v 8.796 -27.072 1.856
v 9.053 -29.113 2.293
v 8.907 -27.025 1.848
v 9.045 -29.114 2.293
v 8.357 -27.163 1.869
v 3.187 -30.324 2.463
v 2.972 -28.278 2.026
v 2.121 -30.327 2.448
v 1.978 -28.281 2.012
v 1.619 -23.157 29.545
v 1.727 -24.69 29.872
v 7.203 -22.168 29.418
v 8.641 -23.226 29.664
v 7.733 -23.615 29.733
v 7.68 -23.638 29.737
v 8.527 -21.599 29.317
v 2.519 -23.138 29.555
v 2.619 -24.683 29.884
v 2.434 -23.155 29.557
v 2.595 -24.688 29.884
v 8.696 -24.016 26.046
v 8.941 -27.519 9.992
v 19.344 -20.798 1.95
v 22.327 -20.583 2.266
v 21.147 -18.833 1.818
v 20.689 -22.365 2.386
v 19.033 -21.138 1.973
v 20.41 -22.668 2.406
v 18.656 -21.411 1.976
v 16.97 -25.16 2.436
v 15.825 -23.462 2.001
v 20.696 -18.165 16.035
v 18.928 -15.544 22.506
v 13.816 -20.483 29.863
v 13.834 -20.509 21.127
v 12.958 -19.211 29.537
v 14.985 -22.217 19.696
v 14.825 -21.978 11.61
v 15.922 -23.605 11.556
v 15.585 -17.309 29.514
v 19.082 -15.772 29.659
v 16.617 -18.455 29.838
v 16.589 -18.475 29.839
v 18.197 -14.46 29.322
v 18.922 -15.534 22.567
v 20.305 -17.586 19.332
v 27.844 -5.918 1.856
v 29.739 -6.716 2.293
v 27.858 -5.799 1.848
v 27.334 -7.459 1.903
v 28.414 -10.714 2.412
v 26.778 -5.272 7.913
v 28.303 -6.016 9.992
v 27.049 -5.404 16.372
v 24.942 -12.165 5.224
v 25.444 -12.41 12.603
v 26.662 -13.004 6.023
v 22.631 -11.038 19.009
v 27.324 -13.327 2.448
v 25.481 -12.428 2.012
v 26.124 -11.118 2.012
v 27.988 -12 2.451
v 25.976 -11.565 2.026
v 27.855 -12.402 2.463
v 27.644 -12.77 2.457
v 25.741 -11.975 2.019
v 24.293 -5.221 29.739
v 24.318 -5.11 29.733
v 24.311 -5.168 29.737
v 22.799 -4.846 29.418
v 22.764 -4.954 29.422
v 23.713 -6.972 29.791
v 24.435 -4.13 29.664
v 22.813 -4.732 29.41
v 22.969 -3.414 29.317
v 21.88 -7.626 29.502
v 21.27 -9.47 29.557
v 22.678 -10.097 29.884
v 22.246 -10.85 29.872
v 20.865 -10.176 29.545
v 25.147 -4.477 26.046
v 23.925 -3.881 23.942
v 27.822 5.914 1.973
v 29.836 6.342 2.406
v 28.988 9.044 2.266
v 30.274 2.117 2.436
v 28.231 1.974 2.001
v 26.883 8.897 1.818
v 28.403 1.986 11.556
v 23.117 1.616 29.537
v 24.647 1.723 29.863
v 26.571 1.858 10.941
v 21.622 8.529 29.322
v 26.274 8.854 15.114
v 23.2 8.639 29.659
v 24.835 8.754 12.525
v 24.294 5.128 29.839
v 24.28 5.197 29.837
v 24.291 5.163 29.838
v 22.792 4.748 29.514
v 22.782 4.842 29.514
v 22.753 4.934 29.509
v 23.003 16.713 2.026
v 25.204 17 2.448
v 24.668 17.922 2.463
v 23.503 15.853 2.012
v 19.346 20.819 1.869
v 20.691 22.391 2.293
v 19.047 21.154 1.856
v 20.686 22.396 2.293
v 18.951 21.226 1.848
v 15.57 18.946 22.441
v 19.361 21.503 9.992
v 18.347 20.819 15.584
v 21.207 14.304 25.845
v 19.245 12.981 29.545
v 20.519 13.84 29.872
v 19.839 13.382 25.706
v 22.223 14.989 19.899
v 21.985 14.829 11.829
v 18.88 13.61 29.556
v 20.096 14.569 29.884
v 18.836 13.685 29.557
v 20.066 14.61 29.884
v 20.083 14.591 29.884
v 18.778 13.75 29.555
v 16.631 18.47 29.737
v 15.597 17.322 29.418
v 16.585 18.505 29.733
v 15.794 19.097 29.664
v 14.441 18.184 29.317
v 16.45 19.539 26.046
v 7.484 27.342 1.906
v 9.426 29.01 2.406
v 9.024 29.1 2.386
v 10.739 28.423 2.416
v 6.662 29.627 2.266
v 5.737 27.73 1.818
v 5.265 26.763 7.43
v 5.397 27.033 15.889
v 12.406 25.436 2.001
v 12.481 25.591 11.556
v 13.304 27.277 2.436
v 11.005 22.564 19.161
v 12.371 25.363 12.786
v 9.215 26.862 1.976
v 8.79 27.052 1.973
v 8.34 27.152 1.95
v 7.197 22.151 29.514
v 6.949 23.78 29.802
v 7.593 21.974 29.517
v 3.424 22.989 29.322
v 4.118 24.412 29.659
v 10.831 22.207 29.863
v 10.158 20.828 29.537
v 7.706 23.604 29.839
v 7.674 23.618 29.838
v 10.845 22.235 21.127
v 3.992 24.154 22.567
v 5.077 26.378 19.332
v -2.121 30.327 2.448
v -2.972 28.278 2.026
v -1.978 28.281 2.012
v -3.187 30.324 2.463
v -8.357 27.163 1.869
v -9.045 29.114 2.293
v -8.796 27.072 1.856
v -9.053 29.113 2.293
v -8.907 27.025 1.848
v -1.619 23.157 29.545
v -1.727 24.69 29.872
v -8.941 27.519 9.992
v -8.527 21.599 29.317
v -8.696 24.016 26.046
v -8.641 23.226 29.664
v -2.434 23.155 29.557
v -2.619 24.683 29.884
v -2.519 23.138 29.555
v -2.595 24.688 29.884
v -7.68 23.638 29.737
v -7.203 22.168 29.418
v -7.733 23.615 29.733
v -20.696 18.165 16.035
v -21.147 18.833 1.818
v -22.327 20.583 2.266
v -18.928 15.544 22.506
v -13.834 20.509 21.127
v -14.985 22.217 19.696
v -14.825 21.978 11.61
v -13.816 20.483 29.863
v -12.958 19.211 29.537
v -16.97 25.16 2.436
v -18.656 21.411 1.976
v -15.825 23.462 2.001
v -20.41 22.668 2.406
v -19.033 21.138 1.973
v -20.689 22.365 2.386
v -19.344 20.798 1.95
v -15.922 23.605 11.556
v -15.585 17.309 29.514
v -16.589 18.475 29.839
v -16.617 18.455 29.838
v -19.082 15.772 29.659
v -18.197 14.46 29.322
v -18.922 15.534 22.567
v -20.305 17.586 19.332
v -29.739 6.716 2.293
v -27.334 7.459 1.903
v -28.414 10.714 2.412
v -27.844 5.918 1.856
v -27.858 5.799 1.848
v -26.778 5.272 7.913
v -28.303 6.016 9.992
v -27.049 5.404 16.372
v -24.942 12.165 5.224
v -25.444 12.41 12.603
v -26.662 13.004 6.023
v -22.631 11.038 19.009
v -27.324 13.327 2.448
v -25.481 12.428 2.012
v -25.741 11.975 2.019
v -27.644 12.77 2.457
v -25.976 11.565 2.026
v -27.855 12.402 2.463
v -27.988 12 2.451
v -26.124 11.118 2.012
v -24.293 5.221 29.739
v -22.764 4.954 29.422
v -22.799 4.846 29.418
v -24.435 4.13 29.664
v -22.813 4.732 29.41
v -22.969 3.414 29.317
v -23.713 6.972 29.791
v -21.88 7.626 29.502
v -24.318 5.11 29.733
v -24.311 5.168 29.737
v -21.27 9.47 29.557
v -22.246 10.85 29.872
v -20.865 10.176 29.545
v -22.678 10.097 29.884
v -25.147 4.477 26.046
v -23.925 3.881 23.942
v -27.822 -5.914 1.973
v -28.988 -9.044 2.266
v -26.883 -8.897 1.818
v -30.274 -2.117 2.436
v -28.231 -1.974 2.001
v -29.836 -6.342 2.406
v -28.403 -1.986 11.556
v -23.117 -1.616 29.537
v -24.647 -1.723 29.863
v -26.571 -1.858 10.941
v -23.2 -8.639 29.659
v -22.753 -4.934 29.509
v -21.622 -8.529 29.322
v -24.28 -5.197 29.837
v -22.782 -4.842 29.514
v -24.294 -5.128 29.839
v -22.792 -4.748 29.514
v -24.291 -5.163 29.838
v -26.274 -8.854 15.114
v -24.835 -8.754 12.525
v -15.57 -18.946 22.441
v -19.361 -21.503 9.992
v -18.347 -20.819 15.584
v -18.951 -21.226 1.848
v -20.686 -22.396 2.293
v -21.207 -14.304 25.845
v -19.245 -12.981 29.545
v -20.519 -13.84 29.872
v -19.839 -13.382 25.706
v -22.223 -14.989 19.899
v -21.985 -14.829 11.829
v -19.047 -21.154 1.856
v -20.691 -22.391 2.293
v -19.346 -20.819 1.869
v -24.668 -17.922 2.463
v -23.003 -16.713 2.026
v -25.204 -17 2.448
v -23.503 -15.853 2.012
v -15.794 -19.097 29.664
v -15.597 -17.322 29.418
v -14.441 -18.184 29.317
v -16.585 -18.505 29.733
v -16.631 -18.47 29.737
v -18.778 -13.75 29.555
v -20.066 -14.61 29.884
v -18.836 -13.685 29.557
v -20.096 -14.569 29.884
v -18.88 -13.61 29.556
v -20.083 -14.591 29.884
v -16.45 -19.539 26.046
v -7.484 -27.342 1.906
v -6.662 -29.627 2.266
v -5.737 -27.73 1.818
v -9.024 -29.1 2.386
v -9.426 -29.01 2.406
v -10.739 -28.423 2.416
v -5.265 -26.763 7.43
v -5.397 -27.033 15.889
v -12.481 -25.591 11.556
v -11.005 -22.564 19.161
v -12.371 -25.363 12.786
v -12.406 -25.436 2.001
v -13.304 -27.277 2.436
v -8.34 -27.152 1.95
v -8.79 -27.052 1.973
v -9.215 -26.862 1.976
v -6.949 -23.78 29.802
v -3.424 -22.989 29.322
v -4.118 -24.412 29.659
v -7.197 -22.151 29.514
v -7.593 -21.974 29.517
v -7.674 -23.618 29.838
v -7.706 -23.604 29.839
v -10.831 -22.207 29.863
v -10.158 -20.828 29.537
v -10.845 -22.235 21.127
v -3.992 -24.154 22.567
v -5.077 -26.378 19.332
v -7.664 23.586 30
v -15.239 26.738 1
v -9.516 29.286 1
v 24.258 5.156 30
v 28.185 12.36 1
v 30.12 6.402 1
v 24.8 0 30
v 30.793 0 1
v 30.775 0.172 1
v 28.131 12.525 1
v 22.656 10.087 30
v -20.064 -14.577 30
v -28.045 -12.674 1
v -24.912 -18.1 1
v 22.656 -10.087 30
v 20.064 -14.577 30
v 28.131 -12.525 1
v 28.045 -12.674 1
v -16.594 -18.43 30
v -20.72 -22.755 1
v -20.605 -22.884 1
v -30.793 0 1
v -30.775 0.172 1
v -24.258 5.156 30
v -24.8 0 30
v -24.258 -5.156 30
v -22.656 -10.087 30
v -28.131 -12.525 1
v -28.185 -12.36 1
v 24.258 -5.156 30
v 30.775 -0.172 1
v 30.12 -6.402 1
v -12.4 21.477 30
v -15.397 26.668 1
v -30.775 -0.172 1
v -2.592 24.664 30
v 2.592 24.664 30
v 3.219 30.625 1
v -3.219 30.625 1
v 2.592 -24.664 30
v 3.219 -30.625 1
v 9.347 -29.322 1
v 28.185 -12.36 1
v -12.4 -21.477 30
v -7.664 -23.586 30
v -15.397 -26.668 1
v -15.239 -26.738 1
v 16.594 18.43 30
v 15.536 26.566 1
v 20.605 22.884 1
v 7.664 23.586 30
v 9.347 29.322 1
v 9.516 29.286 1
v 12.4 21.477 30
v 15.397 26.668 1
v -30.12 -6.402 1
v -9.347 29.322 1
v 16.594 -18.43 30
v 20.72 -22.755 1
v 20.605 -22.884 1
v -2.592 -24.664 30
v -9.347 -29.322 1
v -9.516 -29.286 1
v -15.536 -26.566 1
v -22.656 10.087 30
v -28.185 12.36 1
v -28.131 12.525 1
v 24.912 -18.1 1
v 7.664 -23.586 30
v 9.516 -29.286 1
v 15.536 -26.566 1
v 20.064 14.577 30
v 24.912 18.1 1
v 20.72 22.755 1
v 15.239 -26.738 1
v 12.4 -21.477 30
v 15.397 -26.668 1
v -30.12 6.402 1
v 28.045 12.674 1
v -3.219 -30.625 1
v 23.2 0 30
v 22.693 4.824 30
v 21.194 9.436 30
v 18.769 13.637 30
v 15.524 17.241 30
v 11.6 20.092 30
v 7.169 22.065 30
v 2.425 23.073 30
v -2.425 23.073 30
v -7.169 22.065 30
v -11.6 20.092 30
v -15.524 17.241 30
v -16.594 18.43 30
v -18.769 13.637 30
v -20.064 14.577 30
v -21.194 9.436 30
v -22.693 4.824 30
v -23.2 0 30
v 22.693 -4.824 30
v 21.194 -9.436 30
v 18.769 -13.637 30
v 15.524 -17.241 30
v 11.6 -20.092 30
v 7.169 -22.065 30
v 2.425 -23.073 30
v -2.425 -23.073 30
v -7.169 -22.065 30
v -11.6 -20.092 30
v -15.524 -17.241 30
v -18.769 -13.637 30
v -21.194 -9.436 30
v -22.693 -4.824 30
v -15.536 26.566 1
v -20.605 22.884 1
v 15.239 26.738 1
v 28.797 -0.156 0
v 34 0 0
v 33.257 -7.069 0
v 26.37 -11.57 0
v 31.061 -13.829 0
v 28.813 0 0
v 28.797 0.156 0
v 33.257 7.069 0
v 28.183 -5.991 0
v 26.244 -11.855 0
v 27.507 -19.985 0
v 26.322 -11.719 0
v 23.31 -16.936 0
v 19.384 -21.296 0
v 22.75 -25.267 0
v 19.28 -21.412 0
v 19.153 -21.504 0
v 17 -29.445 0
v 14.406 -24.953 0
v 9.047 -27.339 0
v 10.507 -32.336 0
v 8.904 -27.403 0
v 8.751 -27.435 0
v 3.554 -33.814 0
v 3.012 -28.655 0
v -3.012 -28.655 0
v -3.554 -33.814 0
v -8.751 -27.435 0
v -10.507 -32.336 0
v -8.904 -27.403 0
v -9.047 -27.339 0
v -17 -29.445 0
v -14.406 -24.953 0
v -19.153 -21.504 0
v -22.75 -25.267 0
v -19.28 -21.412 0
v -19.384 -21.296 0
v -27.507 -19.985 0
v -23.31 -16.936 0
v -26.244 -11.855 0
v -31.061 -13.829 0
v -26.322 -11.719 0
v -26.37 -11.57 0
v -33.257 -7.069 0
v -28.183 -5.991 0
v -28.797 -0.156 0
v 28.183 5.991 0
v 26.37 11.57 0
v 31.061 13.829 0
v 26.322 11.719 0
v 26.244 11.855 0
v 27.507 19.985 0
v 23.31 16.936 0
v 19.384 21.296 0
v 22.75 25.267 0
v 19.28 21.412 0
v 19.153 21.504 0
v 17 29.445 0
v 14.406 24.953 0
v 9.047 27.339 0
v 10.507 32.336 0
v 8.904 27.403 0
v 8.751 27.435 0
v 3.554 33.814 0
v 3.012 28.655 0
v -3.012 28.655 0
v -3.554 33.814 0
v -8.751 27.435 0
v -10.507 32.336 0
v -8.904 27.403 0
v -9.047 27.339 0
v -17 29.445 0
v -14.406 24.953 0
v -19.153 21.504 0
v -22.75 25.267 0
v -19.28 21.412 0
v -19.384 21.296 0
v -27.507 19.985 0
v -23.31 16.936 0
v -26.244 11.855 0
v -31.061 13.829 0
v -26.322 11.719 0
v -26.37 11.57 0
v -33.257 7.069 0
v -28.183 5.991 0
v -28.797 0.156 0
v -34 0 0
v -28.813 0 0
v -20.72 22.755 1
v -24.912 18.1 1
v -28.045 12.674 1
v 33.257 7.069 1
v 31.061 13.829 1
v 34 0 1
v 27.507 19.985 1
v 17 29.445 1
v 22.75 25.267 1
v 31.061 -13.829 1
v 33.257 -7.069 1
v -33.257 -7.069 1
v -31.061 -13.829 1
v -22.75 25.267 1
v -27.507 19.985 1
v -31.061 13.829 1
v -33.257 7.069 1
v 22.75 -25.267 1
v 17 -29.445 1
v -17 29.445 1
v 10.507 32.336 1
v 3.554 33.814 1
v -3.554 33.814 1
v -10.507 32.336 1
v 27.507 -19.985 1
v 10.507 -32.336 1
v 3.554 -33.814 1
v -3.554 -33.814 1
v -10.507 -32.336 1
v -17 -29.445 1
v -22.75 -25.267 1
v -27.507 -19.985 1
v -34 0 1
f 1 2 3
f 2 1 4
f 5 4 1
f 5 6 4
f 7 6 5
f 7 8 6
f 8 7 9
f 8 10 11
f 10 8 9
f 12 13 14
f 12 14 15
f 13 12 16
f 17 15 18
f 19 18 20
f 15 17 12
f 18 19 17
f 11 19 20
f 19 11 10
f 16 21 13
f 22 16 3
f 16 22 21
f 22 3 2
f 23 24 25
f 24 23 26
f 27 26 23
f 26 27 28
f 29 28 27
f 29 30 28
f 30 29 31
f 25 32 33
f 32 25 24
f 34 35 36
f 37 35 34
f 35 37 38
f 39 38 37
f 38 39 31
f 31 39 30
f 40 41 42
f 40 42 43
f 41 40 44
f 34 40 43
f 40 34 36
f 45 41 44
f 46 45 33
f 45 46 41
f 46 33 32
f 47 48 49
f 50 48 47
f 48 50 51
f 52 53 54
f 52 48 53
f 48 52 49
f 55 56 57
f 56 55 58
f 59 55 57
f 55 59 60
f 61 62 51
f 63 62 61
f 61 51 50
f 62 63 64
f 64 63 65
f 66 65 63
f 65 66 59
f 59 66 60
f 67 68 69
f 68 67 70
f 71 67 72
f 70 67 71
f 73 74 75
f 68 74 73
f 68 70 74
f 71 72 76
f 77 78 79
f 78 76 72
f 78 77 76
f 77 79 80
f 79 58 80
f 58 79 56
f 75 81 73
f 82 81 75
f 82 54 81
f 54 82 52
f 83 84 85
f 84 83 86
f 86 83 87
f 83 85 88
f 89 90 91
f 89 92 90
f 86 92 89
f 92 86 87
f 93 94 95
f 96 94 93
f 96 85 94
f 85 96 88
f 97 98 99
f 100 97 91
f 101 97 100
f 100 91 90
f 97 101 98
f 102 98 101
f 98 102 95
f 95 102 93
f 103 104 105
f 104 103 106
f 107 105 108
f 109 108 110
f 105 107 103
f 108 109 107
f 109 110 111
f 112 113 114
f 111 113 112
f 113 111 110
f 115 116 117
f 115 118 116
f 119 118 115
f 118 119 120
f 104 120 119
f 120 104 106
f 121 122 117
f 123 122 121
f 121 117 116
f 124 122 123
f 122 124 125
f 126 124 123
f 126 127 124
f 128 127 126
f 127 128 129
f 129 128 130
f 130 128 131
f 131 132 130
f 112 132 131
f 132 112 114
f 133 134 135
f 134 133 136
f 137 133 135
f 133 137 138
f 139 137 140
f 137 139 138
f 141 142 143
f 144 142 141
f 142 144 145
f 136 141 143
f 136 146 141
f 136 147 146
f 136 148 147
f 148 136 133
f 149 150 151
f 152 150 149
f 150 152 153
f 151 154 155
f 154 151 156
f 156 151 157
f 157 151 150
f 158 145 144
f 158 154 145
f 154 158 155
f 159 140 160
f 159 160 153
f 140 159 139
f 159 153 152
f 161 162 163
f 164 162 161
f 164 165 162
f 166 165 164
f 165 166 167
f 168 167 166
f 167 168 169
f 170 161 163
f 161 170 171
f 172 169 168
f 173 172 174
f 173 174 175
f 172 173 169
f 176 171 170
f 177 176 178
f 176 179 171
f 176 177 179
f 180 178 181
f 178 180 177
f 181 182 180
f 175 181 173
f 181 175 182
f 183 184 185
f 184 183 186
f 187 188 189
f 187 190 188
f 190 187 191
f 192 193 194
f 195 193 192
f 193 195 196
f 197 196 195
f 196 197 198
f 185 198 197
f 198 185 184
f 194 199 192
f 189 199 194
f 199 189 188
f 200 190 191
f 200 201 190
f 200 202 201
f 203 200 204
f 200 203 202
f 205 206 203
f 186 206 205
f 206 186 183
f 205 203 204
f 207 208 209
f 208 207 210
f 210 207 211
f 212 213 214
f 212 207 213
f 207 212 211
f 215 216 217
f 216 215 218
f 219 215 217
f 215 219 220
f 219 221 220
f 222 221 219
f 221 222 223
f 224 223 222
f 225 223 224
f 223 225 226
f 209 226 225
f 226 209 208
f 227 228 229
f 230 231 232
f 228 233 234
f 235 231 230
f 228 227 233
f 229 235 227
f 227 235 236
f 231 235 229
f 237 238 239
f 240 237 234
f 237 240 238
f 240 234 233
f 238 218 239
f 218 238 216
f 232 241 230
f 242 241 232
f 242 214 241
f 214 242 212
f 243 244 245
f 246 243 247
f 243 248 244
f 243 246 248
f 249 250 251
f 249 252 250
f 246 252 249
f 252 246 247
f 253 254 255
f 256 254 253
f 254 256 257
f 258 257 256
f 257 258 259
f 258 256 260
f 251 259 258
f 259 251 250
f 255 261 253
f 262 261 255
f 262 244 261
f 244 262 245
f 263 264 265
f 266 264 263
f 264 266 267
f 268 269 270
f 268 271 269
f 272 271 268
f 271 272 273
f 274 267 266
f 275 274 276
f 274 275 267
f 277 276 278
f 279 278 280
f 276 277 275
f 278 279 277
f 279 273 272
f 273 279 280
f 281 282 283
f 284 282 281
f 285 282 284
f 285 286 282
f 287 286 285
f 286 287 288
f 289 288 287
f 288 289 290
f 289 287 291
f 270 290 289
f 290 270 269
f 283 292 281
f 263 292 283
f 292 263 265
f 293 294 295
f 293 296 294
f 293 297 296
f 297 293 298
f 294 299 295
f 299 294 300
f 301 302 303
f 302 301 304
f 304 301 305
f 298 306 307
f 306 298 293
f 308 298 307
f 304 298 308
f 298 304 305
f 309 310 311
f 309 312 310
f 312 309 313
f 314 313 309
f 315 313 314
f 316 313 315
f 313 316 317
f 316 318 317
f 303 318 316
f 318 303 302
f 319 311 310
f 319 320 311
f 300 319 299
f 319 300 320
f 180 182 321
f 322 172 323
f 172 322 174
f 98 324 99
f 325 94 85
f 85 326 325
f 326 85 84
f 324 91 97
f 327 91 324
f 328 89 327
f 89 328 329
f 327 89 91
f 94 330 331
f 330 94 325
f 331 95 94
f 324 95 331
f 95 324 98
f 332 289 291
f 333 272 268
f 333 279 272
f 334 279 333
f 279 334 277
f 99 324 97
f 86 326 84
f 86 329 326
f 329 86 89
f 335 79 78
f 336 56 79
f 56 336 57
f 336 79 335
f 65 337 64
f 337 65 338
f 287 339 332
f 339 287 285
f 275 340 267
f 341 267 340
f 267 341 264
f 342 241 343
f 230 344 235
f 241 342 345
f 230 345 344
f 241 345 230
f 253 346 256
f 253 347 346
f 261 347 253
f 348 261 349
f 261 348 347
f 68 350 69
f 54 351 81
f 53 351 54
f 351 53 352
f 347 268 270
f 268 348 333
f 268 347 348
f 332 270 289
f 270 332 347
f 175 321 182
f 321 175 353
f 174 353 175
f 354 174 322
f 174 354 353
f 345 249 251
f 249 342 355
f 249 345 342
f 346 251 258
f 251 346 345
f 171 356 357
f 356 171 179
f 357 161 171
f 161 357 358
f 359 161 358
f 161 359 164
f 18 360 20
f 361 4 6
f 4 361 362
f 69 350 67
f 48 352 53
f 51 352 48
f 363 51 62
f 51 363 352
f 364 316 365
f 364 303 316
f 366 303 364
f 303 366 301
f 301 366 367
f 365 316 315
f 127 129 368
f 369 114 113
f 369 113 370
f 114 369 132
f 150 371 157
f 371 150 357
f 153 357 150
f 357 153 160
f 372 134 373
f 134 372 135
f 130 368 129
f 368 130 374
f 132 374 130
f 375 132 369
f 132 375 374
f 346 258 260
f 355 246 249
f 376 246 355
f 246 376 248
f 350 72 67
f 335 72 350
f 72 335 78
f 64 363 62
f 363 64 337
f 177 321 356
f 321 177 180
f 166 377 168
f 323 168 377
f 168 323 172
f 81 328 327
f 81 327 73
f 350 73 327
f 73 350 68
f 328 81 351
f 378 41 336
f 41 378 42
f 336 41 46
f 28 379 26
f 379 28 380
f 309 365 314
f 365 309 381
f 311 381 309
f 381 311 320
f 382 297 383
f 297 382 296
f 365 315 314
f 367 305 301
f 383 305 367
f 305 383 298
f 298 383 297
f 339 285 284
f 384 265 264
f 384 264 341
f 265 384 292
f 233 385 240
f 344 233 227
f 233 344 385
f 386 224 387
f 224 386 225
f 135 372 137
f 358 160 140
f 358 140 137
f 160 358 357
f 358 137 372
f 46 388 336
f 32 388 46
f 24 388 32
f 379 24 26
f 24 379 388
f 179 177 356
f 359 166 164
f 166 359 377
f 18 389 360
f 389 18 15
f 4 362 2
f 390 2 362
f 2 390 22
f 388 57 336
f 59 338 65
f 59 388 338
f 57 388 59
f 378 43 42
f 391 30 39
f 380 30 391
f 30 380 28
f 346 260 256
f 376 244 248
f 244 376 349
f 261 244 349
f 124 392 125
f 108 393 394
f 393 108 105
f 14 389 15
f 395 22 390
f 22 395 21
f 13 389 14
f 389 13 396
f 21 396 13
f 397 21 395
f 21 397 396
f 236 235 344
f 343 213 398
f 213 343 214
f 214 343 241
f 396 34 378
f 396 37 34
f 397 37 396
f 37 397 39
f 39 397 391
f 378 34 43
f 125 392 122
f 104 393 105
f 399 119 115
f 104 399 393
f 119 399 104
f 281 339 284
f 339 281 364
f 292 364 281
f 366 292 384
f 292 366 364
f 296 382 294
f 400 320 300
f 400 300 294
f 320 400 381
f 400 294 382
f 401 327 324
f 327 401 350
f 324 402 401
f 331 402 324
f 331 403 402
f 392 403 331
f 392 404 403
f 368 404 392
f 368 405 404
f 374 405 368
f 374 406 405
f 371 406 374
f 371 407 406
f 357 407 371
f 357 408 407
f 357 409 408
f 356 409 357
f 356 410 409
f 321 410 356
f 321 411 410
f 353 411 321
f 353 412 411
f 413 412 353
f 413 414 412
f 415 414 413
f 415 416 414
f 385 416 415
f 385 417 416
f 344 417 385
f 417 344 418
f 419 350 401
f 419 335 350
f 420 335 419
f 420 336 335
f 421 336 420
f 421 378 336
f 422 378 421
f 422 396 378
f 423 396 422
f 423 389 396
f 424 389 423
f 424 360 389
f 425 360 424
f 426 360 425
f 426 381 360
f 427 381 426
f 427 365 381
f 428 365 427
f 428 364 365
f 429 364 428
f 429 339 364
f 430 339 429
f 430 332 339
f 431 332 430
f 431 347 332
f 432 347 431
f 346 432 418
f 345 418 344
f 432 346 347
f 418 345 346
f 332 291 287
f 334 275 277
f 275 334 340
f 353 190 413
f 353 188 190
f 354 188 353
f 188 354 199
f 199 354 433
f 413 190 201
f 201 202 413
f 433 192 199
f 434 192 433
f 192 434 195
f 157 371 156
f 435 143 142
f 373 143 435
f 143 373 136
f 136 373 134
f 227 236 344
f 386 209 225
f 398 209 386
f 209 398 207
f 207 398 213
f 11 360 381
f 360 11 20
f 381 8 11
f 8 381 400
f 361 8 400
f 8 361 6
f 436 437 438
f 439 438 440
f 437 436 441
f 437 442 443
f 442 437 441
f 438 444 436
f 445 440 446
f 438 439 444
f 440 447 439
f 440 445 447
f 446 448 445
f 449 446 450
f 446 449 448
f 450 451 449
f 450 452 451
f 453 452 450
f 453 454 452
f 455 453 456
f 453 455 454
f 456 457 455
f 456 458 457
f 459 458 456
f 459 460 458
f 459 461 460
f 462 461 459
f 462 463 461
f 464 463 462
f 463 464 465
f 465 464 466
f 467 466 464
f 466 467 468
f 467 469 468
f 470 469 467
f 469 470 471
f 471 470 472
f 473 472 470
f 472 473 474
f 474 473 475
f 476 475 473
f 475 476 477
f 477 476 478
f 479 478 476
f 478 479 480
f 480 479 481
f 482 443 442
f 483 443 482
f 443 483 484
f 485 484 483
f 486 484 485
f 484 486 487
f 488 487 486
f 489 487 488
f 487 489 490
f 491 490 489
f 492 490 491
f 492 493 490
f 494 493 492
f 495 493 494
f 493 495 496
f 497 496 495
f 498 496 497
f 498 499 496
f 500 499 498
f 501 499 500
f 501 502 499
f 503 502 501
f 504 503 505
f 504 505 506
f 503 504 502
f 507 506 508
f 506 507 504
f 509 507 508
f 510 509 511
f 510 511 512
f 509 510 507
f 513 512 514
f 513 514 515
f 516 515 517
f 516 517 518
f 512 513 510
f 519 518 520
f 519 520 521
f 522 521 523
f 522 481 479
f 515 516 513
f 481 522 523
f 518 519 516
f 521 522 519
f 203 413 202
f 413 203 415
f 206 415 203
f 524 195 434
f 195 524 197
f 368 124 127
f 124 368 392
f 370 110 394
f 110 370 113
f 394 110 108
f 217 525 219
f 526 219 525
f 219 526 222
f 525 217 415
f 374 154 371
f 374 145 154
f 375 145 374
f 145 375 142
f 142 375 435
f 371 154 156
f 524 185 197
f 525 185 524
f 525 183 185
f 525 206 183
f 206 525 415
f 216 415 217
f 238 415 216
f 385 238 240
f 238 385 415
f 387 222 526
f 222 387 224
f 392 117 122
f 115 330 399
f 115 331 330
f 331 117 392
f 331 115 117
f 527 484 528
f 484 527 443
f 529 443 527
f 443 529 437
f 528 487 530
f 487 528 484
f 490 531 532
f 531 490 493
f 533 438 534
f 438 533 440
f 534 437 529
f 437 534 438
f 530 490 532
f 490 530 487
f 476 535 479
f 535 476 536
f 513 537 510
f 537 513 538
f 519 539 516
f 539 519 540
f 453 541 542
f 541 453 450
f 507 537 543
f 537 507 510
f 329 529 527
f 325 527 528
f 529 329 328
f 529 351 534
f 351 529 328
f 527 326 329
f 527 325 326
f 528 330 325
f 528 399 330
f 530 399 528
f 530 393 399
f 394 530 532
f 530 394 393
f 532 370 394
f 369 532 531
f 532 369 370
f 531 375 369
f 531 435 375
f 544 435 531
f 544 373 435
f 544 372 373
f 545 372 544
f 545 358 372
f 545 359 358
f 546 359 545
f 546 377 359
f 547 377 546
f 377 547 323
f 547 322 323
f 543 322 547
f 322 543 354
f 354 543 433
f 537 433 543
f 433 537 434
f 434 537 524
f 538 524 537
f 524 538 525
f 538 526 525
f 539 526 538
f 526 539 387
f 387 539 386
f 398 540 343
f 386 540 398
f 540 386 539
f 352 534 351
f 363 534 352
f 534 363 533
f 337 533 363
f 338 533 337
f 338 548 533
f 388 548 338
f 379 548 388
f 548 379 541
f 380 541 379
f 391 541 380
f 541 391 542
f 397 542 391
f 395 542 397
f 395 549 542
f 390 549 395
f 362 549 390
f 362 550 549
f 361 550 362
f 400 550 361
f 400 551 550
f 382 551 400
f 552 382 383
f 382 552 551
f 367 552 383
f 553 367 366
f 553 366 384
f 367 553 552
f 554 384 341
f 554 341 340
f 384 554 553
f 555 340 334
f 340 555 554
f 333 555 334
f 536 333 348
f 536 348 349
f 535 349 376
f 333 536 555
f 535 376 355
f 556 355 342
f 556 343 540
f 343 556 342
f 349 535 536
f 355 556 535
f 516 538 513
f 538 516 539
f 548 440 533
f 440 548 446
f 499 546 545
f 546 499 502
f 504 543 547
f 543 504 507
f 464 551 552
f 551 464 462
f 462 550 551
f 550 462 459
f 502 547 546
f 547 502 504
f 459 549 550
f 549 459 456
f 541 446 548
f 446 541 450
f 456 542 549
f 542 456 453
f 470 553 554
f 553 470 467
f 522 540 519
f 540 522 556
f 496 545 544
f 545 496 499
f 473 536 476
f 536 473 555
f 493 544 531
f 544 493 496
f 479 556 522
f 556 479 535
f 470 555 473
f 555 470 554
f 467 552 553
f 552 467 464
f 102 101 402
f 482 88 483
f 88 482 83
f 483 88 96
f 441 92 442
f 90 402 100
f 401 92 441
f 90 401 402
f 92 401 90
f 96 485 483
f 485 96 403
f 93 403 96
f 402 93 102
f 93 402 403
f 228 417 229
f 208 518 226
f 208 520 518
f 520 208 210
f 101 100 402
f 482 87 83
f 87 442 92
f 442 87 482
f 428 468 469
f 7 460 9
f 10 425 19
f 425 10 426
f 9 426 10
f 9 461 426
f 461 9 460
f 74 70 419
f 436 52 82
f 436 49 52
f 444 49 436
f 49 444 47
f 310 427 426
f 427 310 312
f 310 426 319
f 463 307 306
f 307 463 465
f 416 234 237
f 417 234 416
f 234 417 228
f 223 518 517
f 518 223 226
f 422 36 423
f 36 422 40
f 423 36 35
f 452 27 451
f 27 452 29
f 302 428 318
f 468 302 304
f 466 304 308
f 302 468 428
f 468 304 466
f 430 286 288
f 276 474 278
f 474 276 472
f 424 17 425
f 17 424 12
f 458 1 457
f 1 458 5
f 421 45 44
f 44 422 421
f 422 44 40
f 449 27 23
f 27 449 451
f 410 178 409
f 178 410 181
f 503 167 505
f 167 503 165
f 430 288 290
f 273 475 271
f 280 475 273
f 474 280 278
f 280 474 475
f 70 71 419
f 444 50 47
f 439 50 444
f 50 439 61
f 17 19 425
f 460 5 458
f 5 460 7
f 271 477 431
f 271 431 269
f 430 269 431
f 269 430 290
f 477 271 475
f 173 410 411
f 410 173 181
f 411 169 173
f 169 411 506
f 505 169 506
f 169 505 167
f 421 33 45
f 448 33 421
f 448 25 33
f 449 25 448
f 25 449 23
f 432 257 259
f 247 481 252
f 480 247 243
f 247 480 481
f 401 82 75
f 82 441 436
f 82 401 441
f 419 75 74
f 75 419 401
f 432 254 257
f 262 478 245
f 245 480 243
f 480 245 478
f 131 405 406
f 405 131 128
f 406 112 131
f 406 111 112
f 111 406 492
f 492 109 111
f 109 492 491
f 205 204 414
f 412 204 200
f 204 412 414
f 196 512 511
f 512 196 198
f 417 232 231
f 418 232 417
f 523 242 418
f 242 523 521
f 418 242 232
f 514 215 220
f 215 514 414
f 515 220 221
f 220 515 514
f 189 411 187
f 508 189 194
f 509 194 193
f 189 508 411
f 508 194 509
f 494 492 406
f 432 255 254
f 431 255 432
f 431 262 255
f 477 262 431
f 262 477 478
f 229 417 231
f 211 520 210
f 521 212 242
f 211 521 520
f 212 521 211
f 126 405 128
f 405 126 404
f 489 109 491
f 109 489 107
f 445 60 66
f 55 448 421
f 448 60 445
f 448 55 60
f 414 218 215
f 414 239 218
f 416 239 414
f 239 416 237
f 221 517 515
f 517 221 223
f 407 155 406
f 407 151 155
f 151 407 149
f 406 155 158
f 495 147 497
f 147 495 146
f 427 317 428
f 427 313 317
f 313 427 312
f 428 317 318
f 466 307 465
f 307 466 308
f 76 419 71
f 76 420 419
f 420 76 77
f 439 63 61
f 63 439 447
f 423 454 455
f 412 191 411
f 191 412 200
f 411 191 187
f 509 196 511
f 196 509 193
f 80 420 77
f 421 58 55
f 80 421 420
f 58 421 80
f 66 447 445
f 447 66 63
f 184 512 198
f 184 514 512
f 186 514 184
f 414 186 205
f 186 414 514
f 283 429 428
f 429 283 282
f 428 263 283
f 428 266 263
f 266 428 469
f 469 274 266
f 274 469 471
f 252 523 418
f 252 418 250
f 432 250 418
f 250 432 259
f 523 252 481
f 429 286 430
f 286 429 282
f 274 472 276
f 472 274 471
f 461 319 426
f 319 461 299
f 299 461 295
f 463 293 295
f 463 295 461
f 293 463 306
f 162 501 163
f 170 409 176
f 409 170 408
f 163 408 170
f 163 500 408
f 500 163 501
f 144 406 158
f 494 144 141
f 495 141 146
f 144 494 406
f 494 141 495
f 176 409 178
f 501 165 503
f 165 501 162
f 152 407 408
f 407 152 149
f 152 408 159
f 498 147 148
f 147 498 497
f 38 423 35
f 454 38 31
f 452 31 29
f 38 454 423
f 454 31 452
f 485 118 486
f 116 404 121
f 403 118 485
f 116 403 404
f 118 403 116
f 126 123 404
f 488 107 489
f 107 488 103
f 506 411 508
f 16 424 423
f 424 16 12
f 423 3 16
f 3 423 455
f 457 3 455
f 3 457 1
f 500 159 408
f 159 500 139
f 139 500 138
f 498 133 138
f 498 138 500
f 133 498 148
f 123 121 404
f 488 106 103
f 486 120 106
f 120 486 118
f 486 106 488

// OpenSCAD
difference() {
    union() {
        Lip();
        Outer();
        // Floor();
    }
    Inner();
}




// structural
module OuterGaps() {
    rotate([0,0,4])
    RingFrom(33,12)
        translate([0,0,3])
        rotate([-12,0,0])
        linear_extrude(height=28)
            square(7);
}

module Outer() {
    difference(){
        linear_extrude(height = 30, scale = 0.8)
            circle(31);
        OuterGaps();
    }
    
}

module Inner() {
    translate([0, 0, -1])
        linear_extrude(height = 31, scale = 0.8)
            circle(29);
}

module Lip() {
    Panel(34);
}

module Floor() {
    union(){
        difference() {
            Panel(9,30);
            Panel(7,30);
        }
        difference() {
            Panel(25, 30);
            translate([0, 0, 30])
            linear_extrude(height = 1)
                offset(1)
                    Star(24 ,[7,22,22,7]);
            translate([0,0,30]) rotate(23)
            linear_extrude(height = 1)
                RingFrom(21, 6)
                offset(2)
                    polygon(points = [[-4,0],[4,0],[0,8]]);
        }
    }
}


// flexible
module Panel(radius, zAxis=0) {
    translate([0, 0, zAxis])
        cylinder(h=1, r=radius);
}

module Star(num, radii) {
  function r(a) = (floor(a / 10) % 2) ? 10 : 8;
  polygon([for (i=[0:num-1], a=i*360/num, r=radii[i%len(radii)]) [ r*cos(a), r*sin(a) ]]);
}

module RingFrom(radius, count)
{
    for (a = [0 : count - 1]) {
        angle = a * 360 / count;
        translate(radius * [sin(angle), -cos(angle), 0])
            rotate([0, 0, angle])
                children();
    }
}

module Triangle(size=7, zAxis=0) {
    translate([0, 0, zAxis])
    polygon(points = [[-size,0],[size,0],[0,size]]);
}
